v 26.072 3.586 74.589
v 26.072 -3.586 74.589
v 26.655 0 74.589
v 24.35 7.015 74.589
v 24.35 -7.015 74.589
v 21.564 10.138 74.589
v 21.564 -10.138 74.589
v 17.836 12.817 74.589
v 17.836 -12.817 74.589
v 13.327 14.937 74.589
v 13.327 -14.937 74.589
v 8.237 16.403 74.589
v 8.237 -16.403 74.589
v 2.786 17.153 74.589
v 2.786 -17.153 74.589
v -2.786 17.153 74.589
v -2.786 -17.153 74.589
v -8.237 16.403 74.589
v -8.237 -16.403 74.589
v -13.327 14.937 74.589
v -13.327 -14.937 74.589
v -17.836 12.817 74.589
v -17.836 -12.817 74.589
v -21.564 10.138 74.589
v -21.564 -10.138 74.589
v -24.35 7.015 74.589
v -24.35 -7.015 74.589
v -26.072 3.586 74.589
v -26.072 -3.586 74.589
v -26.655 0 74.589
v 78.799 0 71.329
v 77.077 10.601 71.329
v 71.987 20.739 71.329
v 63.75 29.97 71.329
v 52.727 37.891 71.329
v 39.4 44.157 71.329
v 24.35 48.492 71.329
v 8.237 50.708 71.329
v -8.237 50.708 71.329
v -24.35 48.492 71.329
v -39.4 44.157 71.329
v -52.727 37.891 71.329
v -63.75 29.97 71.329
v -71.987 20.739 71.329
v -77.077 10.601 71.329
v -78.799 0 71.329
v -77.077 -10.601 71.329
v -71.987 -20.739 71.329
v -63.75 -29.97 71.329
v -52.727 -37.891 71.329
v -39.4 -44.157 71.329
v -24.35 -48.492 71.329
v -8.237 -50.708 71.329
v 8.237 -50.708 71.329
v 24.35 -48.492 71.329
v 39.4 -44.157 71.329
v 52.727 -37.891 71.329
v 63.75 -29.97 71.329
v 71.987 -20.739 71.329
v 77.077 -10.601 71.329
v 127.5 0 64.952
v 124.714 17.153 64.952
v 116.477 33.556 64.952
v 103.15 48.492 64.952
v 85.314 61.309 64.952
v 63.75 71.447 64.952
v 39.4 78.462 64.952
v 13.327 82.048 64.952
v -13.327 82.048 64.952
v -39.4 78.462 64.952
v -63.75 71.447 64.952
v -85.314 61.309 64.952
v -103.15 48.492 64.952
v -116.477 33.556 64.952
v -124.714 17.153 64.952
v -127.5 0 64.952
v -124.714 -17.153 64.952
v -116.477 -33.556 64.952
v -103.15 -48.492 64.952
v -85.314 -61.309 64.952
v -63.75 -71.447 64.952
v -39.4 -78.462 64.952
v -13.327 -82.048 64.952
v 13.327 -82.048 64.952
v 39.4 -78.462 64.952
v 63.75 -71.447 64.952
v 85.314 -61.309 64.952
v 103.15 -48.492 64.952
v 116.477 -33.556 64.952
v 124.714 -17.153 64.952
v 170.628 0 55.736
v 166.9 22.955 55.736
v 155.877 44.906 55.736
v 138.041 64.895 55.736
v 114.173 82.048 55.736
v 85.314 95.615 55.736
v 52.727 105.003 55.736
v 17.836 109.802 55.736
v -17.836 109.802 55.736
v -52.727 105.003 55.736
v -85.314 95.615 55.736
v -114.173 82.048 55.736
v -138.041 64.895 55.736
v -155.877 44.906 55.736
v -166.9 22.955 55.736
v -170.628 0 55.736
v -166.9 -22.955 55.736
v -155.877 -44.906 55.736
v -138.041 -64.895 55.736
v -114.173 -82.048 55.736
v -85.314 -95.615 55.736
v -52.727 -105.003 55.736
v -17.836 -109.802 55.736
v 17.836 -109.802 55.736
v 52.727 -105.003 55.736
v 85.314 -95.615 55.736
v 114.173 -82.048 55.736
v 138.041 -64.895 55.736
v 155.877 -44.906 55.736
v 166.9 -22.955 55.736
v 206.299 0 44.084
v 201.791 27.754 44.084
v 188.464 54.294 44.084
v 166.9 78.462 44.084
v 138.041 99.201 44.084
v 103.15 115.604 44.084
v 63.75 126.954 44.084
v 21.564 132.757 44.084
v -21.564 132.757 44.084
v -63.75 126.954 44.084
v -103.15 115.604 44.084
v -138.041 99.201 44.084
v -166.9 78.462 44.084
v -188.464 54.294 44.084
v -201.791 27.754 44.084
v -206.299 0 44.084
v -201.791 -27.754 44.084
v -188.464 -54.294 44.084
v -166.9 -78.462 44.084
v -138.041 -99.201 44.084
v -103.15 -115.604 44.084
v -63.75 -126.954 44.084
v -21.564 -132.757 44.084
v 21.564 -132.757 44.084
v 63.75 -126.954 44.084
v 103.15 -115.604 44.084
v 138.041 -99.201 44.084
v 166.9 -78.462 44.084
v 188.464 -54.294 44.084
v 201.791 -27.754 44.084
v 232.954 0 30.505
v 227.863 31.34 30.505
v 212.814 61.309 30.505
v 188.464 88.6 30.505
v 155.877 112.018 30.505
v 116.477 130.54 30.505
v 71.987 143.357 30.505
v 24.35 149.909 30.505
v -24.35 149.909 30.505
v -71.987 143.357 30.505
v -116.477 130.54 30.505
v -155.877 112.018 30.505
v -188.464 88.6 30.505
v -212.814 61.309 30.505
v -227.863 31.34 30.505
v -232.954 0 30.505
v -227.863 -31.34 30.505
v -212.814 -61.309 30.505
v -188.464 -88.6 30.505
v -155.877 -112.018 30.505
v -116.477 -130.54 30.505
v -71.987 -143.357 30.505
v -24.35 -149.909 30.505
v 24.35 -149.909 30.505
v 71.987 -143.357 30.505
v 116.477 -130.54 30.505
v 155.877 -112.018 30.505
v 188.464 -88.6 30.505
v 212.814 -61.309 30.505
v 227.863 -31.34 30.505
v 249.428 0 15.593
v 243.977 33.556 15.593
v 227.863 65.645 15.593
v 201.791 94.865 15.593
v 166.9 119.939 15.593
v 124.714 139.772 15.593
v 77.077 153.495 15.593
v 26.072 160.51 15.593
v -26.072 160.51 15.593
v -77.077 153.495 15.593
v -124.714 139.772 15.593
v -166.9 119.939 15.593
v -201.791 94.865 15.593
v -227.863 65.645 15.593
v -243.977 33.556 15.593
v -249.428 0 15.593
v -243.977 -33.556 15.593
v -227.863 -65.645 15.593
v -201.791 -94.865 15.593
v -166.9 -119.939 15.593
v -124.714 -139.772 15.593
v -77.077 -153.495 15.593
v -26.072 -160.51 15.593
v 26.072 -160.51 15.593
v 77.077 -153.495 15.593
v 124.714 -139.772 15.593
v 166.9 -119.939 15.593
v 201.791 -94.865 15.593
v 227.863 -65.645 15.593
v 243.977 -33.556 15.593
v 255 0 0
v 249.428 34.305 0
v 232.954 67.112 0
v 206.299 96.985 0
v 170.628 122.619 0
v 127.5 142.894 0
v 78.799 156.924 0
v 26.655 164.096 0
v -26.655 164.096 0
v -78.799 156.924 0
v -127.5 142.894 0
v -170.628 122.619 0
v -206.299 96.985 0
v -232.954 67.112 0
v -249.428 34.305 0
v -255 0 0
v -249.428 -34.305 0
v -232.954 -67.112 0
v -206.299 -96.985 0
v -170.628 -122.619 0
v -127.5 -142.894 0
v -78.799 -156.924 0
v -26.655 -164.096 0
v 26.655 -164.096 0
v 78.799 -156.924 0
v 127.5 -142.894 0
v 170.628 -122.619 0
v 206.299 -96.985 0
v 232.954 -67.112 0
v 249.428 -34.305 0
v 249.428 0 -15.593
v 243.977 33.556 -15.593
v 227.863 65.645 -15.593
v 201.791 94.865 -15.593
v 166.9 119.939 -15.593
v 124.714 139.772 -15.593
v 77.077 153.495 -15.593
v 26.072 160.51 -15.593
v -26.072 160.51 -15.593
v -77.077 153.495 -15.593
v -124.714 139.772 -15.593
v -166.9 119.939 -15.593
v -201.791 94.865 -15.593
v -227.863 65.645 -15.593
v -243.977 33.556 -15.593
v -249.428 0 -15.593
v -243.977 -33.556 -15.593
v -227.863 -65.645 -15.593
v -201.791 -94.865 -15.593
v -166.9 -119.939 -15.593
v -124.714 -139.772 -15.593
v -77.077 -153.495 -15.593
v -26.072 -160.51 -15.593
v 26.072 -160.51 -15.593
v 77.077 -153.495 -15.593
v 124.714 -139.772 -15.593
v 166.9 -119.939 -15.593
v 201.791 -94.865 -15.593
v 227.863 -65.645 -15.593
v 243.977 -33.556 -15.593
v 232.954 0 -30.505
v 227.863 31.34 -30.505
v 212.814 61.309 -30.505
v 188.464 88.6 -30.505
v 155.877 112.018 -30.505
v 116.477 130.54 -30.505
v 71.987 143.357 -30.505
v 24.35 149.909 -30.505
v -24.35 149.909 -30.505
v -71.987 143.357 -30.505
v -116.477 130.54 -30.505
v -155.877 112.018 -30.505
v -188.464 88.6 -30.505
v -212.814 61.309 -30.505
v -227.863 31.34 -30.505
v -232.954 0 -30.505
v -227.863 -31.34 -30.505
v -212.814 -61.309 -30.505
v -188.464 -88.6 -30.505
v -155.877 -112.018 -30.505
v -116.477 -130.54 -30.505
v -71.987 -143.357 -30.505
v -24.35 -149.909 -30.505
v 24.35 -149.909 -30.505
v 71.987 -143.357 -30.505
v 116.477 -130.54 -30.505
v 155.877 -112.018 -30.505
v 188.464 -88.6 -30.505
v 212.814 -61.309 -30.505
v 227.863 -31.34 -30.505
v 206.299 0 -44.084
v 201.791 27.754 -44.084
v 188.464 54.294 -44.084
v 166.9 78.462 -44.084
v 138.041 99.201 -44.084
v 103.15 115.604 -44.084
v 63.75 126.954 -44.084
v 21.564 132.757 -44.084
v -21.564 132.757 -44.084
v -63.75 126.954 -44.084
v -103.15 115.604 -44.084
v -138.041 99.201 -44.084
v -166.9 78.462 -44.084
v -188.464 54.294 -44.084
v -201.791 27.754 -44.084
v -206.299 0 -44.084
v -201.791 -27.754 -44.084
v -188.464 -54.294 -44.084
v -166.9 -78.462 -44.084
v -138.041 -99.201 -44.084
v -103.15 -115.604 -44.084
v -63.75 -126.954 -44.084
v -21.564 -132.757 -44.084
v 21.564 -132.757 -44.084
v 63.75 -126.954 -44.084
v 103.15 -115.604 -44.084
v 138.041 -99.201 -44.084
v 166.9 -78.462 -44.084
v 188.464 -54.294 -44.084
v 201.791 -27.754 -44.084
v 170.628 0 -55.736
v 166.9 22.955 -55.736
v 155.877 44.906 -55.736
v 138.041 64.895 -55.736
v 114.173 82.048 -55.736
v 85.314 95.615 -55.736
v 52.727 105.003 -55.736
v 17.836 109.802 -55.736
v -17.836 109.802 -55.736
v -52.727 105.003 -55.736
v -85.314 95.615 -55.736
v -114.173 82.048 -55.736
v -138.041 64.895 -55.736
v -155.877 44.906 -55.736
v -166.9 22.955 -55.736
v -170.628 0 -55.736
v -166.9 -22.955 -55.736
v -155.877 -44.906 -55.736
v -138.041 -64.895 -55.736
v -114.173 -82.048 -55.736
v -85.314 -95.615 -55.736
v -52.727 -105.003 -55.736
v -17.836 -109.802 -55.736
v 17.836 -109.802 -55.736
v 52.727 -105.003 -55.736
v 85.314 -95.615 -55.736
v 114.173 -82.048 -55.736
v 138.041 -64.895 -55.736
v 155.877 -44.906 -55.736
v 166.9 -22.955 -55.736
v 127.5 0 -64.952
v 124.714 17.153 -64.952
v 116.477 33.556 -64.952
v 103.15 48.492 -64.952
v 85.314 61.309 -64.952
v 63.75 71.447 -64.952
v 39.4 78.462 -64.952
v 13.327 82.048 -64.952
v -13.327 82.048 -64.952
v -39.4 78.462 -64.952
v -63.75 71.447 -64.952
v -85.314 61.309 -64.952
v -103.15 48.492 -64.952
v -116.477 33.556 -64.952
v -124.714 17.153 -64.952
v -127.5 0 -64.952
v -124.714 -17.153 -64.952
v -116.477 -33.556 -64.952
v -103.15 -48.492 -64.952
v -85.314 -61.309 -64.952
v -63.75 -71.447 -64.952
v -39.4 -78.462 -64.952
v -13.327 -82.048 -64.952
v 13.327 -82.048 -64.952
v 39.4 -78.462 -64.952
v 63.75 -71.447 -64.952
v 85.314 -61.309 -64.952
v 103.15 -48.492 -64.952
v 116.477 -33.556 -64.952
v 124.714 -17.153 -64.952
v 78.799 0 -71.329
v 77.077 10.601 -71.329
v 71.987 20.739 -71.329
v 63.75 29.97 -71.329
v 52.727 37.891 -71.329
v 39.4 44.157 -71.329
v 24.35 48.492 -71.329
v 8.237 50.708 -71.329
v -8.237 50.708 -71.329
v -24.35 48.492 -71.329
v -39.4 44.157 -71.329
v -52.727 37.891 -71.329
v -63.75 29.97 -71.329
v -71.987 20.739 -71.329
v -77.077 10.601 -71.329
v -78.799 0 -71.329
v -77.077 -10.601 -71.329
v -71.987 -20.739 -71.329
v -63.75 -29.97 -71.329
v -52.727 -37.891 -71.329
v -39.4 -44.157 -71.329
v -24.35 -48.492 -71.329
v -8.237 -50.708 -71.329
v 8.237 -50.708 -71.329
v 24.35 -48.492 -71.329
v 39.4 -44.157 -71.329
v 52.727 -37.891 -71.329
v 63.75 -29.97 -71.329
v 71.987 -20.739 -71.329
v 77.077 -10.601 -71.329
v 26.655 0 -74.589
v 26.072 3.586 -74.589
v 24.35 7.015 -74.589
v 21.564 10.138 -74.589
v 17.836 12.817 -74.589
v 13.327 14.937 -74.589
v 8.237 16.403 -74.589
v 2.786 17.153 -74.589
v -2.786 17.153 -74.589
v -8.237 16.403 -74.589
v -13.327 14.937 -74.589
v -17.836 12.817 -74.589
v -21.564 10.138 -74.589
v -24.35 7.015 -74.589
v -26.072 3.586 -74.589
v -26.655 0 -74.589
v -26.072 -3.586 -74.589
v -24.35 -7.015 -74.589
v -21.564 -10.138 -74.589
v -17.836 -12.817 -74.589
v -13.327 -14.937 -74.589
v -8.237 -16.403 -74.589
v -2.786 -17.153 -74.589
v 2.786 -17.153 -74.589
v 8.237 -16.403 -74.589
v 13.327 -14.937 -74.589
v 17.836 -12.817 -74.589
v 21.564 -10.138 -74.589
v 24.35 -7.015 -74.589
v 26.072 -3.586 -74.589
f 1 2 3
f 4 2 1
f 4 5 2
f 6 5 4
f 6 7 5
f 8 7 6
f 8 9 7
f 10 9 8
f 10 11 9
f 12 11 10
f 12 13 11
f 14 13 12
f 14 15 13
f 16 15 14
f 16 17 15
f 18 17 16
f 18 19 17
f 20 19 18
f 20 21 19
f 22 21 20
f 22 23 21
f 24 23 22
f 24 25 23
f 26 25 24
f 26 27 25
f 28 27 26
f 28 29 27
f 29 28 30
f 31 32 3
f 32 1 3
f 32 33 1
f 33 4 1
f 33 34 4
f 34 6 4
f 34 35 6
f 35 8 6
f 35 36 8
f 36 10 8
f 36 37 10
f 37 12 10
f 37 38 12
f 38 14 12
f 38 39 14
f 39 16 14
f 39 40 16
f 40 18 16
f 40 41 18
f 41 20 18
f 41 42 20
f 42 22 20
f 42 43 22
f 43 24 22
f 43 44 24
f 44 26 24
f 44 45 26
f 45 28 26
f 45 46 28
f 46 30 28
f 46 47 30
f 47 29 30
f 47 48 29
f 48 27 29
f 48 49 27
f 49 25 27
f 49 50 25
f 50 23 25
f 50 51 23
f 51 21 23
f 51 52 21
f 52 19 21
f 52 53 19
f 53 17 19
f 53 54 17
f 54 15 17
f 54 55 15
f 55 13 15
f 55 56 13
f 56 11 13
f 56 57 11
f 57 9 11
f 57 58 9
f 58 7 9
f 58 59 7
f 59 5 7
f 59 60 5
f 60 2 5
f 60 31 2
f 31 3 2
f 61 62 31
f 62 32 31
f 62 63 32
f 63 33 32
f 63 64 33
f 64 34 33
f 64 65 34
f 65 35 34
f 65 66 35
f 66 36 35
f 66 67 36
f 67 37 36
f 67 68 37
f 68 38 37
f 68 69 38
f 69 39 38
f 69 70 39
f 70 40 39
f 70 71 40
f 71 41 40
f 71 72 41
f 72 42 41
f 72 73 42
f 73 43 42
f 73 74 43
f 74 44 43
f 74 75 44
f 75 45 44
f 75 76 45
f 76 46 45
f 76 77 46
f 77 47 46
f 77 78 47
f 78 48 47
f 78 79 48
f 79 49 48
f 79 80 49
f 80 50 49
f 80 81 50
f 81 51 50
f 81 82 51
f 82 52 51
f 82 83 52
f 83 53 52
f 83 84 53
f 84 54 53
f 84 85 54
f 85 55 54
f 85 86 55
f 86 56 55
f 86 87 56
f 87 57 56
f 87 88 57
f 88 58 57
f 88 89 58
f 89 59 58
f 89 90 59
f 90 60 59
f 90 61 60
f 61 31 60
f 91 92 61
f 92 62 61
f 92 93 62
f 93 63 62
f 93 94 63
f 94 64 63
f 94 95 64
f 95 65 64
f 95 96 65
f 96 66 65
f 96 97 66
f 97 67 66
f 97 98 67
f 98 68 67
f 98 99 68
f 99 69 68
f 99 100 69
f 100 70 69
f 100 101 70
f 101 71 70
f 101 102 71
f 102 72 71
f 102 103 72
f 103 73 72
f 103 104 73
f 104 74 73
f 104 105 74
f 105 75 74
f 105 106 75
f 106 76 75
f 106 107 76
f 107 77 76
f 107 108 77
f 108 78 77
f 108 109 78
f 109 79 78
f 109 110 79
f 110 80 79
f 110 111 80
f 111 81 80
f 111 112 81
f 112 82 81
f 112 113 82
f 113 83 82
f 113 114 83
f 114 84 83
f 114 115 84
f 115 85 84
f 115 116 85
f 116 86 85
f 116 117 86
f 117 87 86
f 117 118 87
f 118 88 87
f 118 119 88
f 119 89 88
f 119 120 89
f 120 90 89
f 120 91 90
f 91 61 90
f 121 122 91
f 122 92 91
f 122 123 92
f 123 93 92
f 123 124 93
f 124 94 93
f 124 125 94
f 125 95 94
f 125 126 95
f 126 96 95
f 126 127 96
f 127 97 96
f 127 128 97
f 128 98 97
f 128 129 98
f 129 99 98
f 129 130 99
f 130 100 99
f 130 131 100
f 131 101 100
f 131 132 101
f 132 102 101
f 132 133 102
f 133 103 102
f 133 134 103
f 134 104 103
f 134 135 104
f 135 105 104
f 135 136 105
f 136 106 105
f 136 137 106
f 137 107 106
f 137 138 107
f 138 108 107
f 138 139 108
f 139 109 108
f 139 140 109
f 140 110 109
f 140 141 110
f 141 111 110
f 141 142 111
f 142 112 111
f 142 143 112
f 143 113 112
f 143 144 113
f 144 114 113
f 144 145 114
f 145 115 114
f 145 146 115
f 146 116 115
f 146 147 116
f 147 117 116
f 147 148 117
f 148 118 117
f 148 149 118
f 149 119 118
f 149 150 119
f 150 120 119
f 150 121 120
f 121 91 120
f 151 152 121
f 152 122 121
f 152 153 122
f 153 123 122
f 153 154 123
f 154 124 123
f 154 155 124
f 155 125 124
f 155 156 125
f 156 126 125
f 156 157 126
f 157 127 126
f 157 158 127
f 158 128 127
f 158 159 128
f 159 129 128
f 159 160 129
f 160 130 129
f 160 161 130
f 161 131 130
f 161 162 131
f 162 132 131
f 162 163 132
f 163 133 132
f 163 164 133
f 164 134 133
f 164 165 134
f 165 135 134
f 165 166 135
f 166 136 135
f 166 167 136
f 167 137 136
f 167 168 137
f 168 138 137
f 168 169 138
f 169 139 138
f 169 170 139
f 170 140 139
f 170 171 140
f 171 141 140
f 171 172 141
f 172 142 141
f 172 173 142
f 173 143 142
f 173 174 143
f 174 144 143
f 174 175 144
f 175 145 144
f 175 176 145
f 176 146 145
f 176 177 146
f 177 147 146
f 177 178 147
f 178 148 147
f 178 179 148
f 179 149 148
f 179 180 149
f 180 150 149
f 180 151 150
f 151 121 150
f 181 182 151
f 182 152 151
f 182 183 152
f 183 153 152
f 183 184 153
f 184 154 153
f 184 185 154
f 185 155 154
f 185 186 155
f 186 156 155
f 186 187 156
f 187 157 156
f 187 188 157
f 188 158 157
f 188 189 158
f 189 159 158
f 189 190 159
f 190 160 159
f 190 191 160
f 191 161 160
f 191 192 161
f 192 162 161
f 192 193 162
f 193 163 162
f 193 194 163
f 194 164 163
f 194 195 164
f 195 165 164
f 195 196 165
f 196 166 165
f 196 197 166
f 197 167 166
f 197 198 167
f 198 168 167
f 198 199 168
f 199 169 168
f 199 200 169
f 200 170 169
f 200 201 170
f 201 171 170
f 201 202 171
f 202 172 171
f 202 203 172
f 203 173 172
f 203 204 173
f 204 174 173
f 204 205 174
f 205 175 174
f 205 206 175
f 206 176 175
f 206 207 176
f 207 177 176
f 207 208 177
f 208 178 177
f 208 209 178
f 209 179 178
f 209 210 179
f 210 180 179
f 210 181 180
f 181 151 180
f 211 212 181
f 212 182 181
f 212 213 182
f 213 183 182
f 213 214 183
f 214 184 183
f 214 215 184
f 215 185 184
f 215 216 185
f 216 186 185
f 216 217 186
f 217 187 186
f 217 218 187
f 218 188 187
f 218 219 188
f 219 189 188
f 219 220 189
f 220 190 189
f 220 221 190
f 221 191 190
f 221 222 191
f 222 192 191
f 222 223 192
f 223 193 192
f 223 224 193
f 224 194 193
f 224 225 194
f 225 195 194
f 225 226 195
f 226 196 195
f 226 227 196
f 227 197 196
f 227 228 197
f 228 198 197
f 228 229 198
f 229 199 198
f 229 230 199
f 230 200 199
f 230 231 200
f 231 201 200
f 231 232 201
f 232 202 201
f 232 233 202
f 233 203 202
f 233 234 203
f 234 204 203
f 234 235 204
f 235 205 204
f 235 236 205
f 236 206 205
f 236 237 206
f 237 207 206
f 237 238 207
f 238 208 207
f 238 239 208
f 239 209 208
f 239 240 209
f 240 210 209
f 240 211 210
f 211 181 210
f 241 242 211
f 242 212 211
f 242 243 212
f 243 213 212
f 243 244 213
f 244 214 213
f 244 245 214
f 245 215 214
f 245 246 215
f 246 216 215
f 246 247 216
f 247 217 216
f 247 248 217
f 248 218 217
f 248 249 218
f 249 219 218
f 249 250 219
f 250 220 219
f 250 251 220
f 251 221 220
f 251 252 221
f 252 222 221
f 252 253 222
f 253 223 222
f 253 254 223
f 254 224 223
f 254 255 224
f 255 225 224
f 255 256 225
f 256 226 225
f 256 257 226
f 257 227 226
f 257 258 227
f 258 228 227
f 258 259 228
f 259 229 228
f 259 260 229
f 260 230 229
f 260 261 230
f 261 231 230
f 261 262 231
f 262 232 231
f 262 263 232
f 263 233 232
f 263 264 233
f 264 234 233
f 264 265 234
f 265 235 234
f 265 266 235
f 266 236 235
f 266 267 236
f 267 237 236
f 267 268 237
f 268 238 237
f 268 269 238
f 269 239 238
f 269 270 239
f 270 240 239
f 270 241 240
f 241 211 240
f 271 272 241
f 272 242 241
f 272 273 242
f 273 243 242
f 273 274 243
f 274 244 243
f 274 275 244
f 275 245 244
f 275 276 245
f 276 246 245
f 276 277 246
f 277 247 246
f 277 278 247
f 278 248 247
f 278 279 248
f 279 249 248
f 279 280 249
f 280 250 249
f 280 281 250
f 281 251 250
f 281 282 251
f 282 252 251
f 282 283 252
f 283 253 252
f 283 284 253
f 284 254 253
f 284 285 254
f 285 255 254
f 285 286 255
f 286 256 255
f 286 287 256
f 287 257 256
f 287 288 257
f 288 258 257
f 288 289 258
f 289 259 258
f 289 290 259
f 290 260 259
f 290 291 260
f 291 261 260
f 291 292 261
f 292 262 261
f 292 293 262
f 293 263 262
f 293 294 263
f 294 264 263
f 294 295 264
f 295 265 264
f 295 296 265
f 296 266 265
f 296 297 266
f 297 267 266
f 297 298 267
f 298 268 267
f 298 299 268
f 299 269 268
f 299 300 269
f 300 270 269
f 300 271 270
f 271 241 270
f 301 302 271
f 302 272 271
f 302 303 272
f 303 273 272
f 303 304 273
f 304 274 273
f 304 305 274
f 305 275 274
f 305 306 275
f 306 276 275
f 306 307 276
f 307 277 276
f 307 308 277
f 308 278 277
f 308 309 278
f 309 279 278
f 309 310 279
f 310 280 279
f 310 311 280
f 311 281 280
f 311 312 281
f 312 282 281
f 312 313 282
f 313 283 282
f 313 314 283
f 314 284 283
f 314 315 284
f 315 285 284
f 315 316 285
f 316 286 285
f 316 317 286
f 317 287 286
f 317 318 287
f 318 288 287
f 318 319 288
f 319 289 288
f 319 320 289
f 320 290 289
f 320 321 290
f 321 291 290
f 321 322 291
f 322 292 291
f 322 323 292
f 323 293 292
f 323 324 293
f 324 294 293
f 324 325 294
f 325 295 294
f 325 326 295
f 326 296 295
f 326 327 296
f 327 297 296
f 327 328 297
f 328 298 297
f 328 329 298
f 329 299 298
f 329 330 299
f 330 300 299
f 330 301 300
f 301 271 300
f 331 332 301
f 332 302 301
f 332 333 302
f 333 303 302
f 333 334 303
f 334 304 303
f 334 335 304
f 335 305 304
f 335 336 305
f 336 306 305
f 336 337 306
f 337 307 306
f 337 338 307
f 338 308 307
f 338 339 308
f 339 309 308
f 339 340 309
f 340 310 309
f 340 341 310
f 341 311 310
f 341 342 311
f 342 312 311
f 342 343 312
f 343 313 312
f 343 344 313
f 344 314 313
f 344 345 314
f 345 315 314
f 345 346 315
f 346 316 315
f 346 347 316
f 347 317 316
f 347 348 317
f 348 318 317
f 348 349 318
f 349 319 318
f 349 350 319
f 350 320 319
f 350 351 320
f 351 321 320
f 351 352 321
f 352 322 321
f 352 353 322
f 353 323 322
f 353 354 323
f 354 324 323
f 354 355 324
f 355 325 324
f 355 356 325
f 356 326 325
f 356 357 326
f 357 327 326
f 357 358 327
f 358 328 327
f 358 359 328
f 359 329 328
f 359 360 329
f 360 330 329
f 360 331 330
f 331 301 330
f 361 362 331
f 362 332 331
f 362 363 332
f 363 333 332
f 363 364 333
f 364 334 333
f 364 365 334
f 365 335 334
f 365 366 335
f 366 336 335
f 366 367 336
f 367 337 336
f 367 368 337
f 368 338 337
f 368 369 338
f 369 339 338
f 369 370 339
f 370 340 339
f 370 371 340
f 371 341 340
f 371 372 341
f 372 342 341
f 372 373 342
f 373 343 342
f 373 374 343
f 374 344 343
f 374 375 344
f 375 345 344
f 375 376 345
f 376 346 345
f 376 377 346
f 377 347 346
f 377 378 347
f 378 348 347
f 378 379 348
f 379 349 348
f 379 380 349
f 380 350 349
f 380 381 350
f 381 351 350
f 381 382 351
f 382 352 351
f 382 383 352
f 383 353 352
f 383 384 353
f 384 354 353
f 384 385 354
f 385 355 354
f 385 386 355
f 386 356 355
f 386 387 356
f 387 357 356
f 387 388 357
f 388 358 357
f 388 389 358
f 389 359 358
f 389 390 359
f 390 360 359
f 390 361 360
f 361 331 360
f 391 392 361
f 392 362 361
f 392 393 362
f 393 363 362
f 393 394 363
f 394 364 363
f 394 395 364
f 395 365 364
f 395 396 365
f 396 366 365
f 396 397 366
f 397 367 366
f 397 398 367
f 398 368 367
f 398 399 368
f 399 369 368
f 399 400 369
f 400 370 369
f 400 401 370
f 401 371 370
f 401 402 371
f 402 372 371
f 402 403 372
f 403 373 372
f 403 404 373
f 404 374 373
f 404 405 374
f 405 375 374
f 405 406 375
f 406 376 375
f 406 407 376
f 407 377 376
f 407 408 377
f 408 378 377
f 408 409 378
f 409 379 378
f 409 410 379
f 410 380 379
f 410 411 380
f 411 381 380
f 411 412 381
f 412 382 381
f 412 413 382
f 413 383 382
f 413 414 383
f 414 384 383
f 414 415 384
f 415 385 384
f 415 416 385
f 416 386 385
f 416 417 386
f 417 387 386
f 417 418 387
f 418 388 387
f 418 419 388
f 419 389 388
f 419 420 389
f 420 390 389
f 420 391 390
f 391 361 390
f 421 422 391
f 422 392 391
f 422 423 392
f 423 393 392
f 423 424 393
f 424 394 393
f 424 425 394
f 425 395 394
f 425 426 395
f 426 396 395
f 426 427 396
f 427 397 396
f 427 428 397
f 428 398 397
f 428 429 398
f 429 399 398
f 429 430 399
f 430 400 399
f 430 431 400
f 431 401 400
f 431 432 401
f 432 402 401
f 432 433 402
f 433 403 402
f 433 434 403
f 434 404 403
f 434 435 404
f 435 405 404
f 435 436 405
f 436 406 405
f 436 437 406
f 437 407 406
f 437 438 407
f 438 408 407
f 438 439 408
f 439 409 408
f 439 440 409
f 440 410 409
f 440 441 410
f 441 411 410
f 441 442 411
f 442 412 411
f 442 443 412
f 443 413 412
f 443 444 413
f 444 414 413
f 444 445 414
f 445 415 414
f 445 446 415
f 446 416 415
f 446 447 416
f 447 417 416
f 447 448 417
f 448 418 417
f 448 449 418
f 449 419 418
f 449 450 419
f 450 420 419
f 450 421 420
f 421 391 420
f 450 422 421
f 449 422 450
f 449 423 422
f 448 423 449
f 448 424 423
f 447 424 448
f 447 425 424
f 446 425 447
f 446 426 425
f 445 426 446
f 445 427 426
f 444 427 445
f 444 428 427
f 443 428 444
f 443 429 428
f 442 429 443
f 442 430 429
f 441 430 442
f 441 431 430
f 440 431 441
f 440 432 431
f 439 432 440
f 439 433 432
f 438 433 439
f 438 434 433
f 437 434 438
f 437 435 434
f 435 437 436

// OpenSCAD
// Generated by SolidPython 1.0.1 on 2020-07-29 00:46:53


scale(v = [17, 11, 5]) {
	sphere(r = 15);
}
/***********************************************
*********      SolidPython code:      **********
************************************************
 
# import packages: SolidPython
from solid import *
from solid.utils import *
from itertools import chain, combinations, permutations


class Resize:

    def __init__(self, scad_file):
        self.scad_file = scad_file
        #self.scad_file = import_scad(scad_file)
        # cone/cylinder param:
        self.r1 = 0
        self.r2 = 0
        self.h = 0
        # rectangular prism param:
        self.w = 0
        self.l = 0
        # ellipse param:
        self.r = 0

    # import OpenScad code (file name corresponds to shape)


    # classify shape + parameters
    def assign(self, param1, param2, param3):
        if self.scad_file == 'cone.scad':
            self.r1 = param1
            self.r2 = param2
            self.h = param3
        elif self.scad_file == 'cylinder.scad':
            self.r1 = param1
            self.r2 = param2
            self.h = param3
        elif self.scad_file == 'rectangularPrism.scad':
            self.h = param1
            self.l = param2
            self.w = param3
        else:
            self.r = param1
            self.h = param2

    # resize parameters
    def iterate(self):
        x = range(3, 20, 2)
        i = 1
        if self.scad_file == 'cone.scad':
            tempList = list(permutations(x, 2))
            for temp in tempList:
                param1 = temp[0]
                param2 = temp[1]
                filepath = 'produced_scad_files/' + 'cone' + str(param1) + '_' + str(param2) + '_' + '.scad'
                scad_render_to_file(cylinder(h=param1, r1=param2, r2=0), filepath)

        elif self.scad_file == 'cylinder.scad':
            tempList = list(permutations(x, 3))
            for temp in tempList:
                param1 = temp[0]
                param2 = temp[1]
                filepath = 'produced_scad_files/' + 'cylinder' + str(param1) + '_' + str(param2) + '_' + '.scad'
                scad_render_to_file(cylinder(h=param1, r1=param2, r2=param2), filepath)

        elif self.scad_file == 'rectangularPrism.scad':
            tempList = list(permutations(x, 3))
            for temp in tempList:
                param1 = temp[0]
                param2 = temp[1]
                param3 = temp[2]
                filepath = 'produced_scad_files/' + 'rectangularPrism' + str(param1) + '_' + str(param2) + '_' + str(
                    param3) + '.scad'
                scad_render_to_file(cube(size=(param1, param2, param3)), filepath)

        elif self.scad_file == 'ellipse.scad':
            tempList = list(permutations(x, 4))
            for temp in tempList:
                param1 = temp[0]
                param2 = temp[1]
                param3 = temp[2]
                param4 = temp[3]
                filepath = 'produced_scad_files/' + 'ellipse' + str(param1) + '_' + str(param2) + '_' + str(param3) + '_' + str(param4) + '.scad'
                scad_render_to_file(scale([param1, param2, param3])(sphere(r=param4)), filepath)

    def render_to_scadfile(self):
        scad_render_to_file(scad, 'example.scad') 
 
************************************************/
